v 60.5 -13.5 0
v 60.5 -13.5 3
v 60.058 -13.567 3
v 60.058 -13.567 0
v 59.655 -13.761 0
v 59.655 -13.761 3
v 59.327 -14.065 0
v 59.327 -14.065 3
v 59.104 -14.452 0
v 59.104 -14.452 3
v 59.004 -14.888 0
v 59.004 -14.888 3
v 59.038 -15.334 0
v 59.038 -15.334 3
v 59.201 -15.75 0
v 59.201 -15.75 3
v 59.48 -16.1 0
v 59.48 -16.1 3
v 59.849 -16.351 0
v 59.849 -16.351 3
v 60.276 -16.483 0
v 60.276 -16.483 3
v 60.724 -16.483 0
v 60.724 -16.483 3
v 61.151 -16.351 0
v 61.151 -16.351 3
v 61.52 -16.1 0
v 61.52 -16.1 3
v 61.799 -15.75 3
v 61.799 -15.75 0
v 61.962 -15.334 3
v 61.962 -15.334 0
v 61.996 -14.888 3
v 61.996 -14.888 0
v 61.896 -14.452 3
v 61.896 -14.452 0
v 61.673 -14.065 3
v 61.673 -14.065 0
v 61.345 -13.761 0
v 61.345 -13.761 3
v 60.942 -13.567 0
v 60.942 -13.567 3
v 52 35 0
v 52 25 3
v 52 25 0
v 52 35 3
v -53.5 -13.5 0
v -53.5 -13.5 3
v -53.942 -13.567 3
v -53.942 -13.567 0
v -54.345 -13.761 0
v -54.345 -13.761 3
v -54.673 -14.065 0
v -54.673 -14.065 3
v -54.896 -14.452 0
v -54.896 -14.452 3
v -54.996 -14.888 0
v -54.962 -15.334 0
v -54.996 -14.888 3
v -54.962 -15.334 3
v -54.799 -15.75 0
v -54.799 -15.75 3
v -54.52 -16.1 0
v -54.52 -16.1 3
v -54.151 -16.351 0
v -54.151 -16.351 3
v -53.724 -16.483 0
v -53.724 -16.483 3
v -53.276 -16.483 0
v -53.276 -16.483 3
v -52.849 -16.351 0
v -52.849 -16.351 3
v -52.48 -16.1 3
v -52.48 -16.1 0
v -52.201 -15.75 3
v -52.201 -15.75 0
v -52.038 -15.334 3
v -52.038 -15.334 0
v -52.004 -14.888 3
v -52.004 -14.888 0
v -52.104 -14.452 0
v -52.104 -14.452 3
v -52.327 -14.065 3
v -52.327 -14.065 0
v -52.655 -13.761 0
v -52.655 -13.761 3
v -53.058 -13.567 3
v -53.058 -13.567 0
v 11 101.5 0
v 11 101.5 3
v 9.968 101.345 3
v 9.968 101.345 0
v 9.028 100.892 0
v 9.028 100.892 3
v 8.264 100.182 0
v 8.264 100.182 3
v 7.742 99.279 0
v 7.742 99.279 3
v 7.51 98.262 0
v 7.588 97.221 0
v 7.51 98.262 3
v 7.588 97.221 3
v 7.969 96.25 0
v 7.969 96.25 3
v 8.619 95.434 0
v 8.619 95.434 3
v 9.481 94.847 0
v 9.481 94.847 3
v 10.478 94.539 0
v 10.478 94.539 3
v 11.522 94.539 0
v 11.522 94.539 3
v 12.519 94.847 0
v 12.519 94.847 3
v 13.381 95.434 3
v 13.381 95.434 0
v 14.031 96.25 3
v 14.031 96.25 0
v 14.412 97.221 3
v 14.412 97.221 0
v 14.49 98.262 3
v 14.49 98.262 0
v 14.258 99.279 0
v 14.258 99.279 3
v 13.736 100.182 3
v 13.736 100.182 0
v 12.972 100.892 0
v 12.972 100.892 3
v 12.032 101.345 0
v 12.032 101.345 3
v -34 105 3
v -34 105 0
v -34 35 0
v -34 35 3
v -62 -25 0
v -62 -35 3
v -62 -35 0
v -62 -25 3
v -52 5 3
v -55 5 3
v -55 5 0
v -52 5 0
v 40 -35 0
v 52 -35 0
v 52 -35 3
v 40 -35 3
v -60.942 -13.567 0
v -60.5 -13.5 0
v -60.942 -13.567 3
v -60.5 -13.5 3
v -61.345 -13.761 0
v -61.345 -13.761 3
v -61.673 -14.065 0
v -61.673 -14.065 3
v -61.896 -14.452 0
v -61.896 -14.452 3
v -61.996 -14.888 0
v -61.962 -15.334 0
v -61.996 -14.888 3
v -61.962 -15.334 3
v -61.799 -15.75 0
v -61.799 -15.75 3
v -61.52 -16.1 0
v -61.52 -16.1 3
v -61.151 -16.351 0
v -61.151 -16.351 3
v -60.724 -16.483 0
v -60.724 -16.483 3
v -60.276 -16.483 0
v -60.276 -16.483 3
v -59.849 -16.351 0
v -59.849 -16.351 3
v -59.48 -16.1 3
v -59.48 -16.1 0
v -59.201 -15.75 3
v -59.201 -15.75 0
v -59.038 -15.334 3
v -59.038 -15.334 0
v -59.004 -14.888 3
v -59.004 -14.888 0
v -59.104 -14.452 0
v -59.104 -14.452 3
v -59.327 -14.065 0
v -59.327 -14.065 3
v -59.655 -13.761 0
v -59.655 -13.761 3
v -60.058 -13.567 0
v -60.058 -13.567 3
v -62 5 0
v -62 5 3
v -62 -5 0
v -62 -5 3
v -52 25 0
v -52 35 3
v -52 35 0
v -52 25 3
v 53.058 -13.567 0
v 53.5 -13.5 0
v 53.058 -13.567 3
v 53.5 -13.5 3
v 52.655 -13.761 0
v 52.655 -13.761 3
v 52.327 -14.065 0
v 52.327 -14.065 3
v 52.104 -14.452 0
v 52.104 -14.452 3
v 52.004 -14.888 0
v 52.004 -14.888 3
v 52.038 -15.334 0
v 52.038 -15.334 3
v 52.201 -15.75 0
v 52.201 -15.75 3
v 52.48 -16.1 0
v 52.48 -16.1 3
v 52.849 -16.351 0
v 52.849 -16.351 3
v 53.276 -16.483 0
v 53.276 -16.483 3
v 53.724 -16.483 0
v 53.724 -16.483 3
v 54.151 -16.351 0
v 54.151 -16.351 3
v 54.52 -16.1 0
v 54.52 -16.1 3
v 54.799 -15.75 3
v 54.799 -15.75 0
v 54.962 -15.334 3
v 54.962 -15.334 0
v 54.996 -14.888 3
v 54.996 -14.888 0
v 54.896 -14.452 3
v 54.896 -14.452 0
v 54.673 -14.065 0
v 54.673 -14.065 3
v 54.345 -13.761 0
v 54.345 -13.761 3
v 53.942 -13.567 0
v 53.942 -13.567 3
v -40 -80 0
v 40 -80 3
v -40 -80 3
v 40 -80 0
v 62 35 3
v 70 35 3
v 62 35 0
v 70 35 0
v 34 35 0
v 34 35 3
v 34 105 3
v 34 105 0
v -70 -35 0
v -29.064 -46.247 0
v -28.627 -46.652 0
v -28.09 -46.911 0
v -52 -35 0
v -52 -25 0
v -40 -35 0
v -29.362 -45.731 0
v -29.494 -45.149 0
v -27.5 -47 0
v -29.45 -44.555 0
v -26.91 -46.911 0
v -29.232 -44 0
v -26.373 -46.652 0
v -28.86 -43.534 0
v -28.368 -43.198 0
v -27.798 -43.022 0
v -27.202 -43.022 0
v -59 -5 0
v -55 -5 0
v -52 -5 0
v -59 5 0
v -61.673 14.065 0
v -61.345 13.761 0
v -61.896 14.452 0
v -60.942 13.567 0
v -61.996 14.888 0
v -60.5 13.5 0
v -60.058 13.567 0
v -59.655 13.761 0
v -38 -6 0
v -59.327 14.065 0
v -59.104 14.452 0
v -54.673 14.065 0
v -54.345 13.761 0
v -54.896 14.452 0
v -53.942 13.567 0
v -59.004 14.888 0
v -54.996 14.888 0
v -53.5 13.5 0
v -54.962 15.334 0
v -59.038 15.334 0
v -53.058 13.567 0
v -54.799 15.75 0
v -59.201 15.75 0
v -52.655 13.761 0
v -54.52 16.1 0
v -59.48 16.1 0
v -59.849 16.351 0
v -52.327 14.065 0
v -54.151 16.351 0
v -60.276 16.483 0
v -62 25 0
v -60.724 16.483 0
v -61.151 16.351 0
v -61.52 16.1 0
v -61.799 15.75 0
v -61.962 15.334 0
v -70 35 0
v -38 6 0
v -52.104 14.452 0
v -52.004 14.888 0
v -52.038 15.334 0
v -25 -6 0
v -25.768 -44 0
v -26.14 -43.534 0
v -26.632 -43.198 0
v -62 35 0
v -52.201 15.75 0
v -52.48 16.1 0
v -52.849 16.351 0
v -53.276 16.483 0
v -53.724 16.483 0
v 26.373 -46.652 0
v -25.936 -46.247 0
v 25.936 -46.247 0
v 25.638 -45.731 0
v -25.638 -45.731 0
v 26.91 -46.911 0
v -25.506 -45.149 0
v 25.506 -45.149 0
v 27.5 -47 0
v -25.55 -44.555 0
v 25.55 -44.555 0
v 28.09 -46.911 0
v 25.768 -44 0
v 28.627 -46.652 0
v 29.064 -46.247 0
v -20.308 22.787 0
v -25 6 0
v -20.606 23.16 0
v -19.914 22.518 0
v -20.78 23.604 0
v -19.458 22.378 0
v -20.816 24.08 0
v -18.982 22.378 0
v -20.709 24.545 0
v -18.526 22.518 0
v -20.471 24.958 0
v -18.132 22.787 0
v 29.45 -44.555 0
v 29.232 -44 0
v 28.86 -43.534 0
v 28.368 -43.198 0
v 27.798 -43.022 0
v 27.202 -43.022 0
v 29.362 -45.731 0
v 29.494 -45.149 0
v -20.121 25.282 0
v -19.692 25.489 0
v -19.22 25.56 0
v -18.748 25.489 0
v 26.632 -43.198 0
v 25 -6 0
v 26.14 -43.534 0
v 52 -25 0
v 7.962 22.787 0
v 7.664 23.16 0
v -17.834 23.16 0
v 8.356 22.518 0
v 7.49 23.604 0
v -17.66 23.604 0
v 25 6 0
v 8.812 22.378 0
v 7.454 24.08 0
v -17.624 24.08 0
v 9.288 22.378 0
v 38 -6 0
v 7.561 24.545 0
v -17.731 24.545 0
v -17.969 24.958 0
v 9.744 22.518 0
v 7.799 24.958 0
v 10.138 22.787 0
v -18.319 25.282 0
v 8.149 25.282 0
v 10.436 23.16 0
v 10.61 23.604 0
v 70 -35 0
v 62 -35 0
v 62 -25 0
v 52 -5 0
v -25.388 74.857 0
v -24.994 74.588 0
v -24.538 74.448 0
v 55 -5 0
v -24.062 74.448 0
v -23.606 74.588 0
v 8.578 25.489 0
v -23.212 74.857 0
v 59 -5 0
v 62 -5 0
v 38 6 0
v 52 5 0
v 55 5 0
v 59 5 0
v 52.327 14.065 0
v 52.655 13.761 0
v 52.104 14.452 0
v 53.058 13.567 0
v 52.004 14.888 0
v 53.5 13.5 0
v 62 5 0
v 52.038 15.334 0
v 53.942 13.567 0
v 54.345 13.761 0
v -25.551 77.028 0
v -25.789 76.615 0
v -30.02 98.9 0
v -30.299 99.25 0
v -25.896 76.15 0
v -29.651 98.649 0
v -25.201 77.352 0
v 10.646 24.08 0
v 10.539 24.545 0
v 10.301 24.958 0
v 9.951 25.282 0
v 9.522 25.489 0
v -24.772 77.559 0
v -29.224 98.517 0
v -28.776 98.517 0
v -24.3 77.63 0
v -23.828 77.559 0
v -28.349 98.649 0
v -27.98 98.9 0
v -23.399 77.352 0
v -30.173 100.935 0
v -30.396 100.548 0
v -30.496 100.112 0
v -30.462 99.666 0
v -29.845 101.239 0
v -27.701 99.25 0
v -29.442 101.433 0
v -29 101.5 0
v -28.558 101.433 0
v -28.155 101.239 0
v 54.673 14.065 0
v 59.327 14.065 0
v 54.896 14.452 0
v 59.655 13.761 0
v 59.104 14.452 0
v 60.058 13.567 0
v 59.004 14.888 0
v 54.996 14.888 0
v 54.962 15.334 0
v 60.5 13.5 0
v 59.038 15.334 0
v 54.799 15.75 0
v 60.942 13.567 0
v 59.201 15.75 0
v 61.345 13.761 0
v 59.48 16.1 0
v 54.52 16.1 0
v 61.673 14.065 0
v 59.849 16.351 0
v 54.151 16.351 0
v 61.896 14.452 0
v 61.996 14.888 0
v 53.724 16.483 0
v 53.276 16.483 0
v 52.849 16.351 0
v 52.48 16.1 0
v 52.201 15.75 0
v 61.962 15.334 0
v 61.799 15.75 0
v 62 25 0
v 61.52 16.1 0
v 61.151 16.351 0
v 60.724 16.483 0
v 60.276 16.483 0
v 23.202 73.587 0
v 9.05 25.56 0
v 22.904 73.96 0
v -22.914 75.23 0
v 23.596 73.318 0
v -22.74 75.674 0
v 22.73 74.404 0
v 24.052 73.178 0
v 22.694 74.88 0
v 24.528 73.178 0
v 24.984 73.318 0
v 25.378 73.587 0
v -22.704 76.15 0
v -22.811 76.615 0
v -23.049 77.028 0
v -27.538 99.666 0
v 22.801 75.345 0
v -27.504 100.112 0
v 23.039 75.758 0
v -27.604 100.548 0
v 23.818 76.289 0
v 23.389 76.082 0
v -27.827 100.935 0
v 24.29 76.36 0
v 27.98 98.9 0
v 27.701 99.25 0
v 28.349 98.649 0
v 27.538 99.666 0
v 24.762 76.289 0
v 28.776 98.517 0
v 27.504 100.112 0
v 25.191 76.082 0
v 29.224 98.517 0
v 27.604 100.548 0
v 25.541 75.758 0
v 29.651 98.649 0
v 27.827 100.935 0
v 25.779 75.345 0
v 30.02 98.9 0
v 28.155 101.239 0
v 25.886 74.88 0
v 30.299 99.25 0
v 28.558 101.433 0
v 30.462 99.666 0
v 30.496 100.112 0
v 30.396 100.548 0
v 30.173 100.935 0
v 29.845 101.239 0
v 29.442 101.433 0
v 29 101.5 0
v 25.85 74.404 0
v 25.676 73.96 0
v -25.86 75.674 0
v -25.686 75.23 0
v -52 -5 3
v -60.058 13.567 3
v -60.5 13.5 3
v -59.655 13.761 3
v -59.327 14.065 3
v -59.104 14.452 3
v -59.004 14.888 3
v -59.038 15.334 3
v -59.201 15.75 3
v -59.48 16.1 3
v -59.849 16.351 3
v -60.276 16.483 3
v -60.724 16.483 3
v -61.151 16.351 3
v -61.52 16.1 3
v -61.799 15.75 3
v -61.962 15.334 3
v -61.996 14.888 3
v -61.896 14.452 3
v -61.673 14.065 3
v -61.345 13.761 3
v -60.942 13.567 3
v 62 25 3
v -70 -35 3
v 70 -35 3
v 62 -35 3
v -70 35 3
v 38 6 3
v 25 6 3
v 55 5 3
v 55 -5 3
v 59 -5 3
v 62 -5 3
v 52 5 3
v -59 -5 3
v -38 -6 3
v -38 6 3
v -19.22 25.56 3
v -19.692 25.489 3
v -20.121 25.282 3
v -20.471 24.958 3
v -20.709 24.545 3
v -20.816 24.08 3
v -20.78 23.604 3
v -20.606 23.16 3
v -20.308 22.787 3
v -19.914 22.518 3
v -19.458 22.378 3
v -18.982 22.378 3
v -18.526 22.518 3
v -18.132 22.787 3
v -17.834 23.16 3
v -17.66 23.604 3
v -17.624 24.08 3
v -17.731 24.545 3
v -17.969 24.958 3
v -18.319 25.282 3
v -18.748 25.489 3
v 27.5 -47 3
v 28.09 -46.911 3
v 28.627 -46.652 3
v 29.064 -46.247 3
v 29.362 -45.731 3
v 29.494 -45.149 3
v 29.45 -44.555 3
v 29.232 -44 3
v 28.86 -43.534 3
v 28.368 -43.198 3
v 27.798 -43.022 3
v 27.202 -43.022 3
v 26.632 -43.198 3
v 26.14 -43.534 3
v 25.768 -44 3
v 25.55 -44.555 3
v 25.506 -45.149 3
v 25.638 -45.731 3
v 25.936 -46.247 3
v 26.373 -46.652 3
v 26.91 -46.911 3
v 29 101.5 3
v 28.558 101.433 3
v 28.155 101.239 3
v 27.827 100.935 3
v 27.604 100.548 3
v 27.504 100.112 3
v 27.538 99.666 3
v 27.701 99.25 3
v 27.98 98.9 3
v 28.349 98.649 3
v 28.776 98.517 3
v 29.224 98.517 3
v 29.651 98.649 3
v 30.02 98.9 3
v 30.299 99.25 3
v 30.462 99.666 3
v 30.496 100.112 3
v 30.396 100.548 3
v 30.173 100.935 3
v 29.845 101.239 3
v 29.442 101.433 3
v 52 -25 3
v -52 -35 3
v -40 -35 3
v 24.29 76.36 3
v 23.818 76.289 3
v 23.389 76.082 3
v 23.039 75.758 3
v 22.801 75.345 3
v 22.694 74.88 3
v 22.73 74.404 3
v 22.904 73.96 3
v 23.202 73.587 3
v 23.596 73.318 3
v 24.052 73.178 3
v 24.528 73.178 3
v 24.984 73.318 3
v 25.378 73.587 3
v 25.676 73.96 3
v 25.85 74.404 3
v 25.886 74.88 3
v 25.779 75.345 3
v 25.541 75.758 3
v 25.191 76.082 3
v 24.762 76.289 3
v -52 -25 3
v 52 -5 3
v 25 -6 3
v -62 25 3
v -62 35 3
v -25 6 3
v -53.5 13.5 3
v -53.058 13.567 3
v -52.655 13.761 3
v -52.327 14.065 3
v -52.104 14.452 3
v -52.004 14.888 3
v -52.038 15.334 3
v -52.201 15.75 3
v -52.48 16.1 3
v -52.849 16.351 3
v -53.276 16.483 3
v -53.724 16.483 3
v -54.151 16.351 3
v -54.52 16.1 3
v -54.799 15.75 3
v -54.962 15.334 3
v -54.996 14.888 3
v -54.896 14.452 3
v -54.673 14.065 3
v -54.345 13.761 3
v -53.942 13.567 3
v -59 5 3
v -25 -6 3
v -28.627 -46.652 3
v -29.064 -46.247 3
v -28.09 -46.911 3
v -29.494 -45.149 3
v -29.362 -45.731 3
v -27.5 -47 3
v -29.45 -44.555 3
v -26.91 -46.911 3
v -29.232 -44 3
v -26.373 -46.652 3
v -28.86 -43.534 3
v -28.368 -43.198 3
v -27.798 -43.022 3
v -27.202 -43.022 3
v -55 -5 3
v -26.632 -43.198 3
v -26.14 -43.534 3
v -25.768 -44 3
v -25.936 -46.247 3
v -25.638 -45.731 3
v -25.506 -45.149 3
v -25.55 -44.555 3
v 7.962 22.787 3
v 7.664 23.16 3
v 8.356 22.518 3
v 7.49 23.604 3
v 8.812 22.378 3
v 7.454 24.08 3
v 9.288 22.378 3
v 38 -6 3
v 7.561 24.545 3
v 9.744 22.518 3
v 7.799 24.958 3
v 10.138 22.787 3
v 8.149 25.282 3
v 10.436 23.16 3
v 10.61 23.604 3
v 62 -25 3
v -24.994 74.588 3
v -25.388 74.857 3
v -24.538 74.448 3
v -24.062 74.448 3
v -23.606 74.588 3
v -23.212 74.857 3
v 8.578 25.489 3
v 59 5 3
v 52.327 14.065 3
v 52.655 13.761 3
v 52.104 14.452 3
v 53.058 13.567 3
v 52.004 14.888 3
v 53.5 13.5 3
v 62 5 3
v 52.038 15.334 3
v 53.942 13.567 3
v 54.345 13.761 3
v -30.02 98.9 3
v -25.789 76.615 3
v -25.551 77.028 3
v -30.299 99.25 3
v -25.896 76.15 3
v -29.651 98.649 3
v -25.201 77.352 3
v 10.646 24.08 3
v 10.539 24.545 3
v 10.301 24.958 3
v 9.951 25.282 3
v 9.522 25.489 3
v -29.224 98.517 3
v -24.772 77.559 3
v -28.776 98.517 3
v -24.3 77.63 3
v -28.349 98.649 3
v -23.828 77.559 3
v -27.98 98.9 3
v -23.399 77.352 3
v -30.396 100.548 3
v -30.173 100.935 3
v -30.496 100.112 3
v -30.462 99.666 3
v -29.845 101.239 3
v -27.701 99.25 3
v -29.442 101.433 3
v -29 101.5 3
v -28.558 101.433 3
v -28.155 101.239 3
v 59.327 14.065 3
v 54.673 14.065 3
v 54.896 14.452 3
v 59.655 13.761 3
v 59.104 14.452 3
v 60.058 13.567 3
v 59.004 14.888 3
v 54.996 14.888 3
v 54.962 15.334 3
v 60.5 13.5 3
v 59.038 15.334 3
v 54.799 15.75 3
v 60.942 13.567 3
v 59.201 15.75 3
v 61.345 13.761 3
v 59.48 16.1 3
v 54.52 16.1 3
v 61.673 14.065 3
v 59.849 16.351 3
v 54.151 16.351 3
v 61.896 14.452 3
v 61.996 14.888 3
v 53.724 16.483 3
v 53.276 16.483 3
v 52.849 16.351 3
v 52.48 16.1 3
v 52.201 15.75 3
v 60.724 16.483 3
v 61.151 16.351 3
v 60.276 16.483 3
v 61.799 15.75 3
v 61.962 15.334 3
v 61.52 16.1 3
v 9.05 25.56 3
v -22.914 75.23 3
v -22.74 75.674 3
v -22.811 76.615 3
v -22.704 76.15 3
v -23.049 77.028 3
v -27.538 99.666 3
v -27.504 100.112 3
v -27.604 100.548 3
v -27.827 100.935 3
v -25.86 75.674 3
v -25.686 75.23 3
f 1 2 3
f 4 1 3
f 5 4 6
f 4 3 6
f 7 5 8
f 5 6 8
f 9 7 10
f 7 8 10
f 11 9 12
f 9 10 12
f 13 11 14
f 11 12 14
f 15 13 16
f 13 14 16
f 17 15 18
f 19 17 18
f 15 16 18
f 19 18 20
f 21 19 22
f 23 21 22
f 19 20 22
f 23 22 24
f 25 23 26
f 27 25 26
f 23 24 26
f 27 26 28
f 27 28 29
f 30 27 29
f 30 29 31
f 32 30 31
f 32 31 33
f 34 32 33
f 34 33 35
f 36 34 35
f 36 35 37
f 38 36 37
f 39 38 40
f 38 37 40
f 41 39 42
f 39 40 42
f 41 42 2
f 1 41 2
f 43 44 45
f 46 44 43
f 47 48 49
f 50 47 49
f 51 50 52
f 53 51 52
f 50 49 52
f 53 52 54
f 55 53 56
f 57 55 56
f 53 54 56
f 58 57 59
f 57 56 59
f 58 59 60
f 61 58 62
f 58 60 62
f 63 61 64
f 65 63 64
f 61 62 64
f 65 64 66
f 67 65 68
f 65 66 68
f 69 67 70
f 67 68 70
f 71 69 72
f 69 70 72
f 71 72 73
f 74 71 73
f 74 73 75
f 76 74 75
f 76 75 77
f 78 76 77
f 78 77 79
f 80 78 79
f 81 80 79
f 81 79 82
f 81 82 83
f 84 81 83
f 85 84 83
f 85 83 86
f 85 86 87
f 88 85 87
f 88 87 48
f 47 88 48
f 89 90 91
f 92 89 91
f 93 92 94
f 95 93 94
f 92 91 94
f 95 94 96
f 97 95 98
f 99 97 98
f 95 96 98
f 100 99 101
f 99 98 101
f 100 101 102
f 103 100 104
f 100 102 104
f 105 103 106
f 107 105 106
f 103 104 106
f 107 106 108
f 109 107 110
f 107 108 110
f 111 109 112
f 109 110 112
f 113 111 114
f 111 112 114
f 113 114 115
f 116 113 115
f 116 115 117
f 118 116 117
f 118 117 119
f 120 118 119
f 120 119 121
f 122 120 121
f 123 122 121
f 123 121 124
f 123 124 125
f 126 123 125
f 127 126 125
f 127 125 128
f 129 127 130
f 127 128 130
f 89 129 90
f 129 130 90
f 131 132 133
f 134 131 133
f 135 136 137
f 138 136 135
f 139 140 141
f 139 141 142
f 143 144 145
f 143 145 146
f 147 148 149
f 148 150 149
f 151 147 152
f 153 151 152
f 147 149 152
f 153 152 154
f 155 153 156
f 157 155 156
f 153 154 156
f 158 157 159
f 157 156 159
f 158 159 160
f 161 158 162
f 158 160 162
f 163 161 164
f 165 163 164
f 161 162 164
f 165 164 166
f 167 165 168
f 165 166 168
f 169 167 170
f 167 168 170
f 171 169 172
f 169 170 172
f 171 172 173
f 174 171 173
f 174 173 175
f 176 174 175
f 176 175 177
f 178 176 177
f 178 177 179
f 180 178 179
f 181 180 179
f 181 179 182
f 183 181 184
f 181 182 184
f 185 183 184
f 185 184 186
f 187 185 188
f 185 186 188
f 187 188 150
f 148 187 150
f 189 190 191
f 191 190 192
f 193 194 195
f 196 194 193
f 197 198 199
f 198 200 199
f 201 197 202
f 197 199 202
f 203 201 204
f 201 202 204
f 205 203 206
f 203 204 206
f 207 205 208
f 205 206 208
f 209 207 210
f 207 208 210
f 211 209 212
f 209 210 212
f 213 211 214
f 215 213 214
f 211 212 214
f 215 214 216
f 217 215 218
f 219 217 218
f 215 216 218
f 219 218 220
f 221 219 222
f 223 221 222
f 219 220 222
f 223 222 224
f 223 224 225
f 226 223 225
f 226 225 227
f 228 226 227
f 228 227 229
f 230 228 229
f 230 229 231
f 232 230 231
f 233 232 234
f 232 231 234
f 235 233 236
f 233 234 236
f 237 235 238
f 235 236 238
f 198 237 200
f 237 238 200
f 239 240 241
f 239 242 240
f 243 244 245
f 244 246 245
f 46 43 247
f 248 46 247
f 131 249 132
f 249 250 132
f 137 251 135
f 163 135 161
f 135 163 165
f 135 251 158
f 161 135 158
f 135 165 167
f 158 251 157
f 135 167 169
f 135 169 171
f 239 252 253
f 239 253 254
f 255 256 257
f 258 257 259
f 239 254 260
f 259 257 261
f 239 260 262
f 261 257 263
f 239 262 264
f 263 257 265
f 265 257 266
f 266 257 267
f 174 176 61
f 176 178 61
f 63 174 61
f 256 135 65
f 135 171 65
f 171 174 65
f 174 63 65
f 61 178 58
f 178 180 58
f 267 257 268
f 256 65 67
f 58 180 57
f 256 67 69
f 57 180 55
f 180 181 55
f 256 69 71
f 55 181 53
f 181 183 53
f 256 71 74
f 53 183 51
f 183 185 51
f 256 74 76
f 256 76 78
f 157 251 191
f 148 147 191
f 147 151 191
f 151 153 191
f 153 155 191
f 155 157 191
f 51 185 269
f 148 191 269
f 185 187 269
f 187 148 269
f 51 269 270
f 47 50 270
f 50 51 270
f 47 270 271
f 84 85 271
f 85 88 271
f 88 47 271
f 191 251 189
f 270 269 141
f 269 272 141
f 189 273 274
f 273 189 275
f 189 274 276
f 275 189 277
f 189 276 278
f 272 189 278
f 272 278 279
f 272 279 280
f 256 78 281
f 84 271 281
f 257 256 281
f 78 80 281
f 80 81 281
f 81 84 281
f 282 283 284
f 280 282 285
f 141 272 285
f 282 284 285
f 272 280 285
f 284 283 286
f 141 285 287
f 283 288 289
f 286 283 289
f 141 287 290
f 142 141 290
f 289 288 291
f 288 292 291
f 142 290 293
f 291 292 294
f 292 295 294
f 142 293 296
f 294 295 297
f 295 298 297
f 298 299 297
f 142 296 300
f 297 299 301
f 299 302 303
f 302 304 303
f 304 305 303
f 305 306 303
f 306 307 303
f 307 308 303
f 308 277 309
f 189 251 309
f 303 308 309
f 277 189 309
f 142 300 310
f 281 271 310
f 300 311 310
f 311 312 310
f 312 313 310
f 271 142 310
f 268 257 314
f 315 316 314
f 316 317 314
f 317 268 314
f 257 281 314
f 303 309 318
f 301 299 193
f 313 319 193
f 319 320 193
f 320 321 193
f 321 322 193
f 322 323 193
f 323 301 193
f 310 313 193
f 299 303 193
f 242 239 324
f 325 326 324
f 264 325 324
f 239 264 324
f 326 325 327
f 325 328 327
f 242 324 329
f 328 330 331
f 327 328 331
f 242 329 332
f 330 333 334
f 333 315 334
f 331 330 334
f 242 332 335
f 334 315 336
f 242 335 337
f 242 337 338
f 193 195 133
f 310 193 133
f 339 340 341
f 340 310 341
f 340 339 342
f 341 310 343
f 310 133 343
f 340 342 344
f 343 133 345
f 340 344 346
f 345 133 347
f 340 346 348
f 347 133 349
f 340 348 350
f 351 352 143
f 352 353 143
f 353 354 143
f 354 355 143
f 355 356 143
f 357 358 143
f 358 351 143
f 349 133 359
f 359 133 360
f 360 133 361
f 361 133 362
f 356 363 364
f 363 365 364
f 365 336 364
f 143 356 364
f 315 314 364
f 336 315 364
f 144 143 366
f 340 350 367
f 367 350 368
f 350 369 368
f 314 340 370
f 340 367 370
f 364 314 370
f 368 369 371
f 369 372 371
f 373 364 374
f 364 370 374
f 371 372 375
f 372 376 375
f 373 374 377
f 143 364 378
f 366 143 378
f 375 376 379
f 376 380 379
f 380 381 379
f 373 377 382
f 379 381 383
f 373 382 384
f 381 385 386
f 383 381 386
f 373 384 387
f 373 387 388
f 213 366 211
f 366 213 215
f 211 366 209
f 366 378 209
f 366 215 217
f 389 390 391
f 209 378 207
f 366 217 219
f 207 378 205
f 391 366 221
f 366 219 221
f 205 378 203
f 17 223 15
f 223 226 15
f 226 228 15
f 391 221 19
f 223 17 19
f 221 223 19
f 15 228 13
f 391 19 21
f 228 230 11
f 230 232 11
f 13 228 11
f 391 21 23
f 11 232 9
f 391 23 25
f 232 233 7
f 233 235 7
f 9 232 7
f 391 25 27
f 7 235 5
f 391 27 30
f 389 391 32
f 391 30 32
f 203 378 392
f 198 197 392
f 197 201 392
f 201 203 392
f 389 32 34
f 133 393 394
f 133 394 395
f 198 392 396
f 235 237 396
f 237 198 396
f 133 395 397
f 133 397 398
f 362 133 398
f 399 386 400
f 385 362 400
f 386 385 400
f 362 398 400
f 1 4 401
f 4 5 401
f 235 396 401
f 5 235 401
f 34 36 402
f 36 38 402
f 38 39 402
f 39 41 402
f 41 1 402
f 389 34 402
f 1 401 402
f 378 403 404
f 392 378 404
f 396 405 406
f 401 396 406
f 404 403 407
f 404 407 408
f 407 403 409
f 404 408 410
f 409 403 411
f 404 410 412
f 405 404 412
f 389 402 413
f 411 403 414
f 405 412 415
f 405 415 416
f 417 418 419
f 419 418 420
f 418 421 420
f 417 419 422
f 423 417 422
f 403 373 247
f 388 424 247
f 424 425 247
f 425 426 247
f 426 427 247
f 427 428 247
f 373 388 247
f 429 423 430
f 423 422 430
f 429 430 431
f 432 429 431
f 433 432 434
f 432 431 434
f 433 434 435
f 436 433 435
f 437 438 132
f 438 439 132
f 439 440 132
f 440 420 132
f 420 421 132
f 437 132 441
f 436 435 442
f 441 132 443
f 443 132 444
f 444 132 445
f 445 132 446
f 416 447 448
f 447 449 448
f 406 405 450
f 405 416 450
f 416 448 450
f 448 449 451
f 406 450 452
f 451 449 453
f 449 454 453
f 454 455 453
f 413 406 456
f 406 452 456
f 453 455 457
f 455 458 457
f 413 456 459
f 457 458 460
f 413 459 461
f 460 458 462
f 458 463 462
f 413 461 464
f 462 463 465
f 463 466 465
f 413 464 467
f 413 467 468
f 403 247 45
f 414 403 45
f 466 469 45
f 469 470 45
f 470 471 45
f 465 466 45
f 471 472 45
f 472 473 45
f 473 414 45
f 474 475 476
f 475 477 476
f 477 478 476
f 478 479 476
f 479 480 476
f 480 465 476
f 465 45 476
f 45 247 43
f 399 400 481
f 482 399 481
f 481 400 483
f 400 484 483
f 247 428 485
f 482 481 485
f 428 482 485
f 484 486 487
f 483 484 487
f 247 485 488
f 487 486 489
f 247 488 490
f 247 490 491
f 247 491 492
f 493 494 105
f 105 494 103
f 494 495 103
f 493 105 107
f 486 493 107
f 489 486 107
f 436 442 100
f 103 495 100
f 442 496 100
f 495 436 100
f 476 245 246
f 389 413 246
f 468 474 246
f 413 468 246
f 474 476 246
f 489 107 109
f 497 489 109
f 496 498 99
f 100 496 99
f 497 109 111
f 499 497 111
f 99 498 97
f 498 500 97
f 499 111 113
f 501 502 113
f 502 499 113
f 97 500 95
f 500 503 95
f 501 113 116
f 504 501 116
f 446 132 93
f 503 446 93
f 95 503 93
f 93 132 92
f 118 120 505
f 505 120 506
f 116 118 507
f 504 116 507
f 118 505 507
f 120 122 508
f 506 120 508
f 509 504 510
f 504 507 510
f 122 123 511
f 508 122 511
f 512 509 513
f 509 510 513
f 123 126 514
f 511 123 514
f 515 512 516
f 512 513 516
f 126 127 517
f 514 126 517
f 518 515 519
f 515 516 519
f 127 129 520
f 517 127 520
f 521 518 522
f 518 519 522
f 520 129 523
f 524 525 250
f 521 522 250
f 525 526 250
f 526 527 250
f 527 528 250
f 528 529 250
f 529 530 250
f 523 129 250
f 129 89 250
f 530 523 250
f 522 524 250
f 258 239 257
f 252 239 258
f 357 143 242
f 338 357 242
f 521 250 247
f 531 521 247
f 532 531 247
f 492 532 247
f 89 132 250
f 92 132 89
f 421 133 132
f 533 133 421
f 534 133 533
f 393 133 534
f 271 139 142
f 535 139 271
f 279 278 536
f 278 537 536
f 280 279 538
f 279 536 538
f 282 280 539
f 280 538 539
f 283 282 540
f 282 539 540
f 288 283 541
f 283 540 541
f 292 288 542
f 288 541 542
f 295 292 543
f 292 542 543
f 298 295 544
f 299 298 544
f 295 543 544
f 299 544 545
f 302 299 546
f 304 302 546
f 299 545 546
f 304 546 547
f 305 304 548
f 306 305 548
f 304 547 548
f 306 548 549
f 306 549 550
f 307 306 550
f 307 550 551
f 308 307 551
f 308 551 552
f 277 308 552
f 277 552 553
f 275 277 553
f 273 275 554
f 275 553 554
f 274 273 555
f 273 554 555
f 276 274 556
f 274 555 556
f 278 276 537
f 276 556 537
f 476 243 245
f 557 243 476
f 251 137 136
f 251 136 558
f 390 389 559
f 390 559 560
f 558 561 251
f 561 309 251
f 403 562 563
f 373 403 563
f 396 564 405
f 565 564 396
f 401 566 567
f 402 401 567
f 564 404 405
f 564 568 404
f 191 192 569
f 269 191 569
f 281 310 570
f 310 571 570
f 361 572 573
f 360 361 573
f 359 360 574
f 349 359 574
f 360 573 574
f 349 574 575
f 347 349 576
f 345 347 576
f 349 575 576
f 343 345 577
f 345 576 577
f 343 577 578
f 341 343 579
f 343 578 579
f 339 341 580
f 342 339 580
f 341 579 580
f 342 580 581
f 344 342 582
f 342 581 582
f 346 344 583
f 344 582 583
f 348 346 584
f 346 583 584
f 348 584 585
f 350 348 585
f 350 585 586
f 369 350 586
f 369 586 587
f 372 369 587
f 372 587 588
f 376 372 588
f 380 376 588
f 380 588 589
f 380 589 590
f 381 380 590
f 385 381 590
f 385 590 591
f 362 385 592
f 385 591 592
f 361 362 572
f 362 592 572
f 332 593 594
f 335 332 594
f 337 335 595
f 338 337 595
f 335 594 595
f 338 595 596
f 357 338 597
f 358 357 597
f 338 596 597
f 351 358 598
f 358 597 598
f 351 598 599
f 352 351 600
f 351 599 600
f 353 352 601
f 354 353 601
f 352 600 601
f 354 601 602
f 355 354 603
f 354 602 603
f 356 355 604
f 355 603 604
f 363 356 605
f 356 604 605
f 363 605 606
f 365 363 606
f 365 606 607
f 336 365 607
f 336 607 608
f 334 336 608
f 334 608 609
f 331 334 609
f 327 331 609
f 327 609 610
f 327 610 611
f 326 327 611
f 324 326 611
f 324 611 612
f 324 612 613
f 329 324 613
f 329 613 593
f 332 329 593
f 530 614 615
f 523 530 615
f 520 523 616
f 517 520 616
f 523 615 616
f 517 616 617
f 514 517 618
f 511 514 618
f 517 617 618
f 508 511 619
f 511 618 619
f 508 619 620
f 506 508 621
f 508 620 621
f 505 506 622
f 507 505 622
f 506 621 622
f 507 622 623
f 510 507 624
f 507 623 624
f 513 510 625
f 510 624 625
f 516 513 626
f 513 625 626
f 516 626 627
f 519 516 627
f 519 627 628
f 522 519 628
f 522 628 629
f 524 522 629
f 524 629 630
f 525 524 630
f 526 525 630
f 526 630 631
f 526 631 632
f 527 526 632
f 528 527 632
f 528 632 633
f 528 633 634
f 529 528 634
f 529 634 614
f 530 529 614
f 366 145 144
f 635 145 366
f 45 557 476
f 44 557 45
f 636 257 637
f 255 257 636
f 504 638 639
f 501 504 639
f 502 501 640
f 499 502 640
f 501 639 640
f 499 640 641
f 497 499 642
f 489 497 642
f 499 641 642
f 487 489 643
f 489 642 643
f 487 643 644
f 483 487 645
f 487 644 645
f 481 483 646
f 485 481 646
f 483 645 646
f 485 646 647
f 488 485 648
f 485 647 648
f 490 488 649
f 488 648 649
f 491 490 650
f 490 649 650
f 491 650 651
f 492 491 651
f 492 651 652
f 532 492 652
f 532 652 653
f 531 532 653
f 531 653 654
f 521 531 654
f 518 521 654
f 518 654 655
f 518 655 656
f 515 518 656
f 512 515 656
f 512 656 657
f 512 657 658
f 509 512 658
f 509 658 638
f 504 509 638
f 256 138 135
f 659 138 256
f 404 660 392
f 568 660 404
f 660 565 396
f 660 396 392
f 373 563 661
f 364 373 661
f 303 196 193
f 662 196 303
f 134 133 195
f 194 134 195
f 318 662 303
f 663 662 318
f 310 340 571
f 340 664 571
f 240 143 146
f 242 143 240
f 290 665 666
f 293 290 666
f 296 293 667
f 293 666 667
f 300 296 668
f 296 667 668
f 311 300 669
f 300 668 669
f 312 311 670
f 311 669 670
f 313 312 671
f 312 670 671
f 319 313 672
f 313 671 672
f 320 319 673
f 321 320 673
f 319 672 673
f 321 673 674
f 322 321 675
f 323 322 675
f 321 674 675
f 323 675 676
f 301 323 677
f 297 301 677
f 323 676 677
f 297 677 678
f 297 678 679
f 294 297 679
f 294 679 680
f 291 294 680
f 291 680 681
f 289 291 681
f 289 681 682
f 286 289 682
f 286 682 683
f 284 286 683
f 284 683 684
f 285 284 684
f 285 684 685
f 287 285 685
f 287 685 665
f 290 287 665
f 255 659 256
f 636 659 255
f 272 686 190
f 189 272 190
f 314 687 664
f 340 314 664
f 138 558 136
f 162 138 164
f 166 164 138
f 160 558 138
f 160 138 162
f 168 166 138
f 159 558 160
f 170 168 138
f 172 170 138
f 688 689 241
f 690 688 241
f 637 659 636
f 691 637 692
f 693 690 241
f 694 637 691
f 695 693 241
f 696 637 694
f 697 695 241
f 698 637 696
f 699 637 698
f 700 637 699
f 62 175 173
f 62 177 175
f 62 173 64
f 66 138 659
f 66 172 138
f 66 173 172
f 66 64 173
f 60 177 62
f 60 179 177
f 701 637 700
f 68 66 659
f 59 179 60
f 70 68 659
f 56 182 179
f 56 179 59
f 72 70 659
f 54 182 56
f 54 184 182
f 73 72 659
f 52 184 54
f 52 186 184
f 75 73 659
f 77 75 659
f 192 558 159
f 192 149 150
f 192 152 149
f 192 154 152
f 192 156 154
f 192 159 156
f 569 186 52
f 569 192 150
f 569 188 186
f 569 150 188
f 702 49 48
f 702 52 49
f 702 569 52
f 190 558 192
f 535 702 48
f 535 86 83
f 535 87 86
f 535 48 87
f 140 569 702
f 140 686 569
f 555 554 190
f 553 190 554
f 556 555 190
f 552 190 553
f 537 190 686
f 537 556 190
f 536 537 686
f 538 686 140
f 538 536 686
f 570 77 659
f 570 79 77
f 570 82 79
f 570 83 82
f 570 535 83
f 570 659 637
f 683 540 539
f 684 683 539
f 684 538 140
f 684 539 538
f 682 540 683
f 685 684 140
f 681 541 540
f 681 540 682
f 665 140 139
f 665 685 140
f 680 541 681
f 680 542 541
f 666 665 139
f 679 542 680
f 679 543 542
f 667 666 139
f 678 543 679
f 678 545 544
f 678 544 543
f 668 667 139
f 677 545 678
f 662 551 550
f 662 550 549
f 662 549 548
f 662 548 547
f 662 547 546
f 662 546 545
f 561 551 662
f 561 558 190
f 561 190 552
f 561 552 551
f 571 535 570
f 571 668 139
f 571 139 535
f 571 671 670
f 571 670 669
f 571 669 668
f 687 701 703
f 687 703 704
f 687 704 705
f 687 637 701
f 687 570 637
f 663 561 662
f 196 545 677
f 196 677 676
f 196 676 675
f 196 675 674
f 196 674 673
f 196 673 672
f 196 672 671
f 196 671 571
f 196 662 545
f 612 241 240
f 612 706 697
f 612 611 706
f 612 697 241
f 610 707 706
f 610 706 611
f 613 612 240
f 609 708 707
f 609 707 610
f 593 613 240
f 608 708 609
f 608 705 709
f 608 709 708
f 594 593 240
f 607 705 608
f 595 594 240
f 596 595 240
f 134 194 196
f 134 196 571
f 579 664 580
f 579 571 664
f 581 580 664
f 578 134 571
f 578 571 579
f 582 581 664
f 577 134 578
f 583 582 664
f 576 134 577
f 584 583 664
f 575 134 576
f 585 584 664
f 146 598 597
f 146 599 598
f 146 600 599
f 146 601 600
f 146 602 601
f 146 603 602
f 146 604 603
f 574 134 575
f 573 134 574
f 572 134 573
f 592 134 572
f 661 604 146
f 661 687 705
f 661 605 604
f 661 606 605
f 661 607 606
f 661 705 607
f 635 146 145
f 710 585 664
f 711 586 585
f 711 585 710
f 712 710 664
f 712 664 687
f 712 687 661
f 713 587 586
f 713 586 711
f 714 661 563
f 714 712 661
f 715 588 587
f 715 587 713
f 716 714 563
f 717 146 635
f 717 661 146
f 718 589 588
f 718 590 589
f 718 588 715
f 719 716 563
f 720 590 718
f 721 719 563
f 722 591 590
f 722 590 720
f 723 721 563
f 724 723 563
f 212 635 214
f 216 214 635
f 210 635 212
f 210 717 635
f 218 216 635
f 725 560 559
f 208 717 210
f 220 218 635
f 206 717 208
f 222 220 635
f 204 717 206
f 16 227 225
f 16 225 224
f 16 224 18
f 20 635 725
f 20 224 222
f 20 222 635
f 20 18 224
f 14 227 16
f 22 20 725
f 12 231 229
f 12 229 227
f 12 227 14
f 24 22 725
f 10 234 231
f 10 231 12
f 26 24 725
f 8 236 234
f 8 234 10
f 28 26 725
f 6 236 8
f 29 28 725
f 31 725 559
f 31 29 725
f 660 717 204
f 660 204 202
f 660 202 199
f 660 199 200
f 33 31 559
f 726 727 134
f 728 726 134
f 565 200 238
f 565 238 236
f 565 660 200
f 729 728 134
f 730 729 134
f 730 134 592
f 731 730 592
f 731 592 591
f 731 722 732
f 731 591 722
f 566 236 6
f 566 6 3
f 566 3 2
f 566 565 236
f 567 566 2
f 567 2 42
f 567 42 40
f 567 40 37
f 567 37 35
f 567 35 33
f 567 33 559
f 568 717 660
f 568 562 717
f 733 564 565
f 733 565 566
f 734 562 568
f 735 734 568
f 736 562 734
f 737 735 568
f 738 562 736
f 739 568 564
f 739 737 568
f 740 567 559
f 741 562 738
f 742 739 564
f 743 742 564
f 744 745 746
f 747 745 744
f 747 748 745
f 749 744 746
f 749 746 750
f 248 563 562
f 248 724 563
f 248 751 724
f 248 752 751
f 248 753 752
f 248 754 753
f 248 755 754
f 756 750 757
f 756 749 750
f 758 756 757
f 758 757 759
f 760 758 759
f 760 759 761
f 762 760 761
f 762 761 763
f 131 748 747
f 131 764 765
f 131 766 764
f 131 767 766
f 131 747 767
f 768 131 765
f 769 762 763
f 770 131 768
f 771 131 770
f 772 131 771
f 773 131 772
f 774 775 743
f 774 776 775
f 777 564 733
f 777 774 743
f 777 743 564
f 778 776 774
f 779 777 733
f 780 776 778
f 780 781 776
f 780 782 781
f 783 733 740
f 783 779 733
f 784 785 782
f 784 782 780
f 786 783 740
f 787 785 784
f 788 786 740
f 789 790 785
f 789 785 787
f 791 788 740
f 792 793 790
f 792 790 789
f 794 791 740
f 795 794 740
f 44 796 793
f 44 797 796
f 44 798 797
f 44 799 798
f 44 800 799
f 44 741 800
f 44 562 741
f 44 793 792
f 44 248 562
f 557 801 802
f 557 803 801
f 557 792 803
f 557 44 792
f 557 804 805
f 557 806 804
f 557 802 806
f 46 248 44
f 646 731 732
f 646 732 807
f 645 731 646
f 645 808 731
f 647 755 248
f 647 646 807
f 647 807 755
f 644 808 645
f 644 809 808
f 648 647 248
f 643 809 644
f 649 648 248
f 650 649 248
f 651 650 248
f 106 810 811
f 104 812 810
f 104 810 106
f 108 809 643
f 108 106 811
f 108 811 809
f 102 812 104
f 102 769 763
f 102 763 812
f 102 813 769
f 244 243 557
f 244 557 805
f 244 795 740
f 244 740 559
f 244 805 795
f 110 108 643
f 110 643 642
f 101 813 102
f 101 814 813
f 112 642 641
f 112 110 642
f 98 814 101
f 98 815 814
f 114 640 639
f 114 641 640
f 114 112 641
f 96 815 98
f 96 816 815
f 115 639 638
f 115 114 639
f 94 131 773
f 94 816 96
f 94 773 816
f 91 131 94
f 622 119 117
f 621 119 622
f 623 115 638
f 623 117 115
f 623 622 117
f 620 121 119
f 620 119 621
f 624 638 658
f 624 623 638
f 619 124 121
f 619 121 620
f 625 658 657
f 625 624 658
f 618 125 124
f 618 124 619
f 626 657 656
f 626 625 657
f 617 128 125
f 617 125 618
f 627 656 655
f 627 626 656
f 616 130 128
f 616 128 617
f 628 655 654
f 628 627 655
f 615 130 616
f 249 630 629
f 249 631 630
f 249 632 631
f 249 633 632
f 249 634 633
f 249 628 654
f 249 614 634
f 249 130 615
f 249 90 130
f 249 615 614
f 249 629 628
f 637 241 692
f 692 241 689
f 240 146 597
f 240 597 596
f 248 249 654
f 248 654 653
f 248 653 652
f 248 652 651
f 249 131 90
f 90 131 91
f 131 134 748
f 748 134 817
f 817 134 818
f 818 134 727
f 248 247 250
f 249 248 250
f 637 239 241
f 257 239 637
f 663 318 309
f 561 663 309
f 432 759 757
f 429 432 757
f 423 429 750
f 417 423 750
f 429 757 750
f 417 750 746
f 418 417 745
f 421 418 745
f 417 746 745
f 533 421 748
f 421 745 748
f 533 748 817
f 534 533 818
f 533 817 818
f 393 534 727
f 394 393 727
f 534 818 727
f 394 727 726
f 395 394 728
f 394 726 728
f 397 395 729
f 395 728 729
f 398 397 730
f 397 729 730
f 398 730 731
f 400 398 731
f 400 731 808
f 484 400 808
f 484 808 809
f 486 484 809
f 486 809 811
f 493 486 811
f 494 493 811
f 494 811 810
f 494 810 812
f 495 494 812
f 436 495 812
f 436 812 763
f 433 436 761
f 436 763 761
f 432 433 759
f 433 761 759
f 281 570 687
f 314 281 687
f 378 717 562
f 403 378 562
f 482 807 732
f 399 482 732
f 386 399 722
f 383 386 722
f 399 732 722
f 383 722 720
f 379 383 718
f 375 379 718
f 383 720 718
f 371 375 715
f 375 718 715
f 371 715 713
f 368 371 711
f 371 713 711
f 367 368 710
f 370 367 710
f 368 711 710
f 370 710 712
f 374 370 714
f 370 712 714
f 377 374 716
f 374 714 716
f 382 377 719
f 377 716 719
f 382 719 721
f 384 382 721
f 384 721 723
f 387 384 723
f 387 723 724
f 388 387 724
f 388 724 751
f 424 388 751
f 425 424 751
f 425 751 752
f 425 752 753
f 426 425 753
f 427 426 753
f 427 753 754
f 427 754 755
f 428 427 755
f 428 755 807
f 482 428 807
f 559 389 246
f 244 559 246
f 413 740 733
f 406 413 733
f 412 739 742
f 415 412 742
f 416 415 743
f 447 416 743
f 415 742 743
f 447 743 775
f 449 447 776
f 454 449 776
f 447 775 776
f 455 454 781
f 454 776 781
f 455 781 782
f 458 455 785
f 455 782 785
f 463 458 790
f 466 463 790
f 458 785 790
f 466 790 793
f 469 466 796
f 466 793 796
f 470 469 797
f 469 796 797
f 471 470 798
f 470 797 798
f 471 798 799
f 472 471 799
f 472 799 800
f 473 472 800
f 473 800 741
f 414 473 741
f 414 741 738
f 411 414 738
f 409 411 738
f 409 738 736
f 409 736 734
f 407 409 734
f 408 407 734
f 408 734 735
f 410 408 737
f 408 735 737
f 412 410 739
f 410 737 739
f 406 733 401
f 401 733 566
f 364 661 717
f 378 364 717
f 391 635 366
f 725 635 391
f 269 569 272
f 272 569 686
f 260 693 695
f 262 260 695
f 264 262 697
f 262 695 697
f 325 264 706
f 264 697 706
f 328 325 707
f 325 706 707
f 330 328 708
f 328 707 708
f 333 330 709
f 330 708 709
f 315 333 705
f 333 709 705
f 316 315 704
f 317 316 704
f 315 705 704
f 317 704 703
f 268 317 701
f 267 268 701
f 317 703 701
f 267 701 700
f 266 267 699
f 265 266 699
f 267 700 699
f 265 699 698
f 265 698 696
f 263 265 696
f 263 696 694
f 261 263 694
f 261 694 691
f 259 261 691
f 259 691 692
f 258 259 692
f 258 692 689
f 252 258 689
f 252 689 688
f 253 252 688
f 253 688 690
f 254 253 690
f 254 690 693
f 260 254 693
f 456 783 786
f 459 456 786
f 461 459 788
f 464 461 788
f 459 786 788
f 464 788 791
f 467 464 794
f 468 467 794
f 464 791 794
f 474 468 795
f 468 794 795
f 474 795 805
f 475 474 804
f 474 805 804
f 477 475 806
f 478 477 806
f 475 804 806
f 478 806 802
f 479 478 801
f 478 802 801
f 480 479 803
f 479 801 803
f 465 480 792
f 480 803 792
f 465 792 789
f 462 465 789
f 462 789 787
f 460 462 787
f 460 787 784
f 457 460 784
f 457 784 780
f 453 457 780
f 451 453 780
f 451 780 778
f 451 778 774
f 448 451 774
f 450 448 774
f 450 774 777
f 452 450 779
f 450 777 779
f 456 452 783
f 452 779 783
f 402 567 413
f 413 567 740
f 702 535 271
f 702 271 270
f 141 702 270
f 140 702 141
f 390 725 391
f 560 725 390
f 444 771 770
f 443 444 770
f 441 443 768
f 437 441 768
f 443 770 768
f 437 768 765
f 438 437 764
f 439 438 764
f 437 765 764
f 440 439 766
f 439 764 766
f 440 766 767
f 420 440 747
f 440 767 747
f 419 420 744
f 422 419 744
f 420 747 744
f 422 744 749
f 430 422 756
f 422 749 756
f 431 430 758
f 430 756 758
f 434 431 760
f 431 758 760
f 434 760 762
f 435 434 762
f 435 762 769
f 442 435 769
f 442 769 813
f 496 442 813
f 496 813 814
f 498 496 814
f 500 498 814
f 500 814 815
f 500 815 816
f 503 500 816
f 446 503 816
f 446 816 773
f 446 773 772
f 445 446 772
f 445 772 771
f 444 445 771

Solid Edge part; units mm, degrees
sketch "Sketch1" plane through (0, 0, 0) normal (0, 0, 1) x (1, 0, 0)
  line L0 (70, -35) -> (70, 35)
  line L1 (70, 35) -> (34, 35)
  line L2 (34, 35) -> (34, 105)
  line L3 (34, 105) -> (-34, 105)
  line L4 (-34, 105) -> (-34, 35)
  line L5 (-34, 35) -> (-70, 35)
  line L6 (-70, 35) -> (-70, -35)
  line L7 (-40, -35) -> (-70, -35)
  line L8 (-40, -80) -> (-40, -35)
  line L9 (40, -80) -> (-40, -80)
  line L10 (40, -35) -> (40, -80)
  line L11 (70, -35) -> (40, -35)
  dimension "D1" = 70
  dimension "D2" = 30
  dimension "D3" = 45
  dimension "D4" = 140
  dimension "D5" = 68
  dimension "D6" = 36
  dimension "D7" = 70
extrude "Ajout_matière_2" add sketch "Sketch1" along normal blind 3
sketch "Sketch2" plane through (0, -7.5, 3) normal (0, 0, 1) x (0, -1, 0)
  line L0 (-12.5, 55) -> (-2.5, 55)
  line L1 (-2.5, 55) -> (-2.5, 52)
  line L2 (-2.5, 52) -> (-12.5, 52)
  line L3 (-12.5, 52) -> (-12.5, 55)
  line L4 (-13.5, 25) -> (-1.5, 25)
  line L5 (-1.5, 25) -> (-1.5, 38)
  line L6 (-1.5, 38) -> (-13.5, 38)
  line L7 (-13.5, 38) -> (-13.5, 25)
  circle A0 centre (37.5, 27.5) radius 2
  line L8 (-12.5, 59) -> (-2.5, 59)
  line L9 (-2.5, 59) -> (-2.5, 62)
  line L10 (-2.5, 62) -> (-12.5, 62)
  line L11 (-12.5, 62) -> (-12.5, 59)
  dimension "D1" = 10
  dimension "D2" = 3
  dimension "D3" = 4
  dimension "D4" = 8
  dimension "D5" = 4
  dimension "D6" = 35
  dimension "D7" = 27.5
  dimension "D8" = 32
  dimension "D9" = 12
  dimension "D10" = 13
extrude "Cutout1" cut sketch "Sketch2" against normal blind 6.2892
sketch "Sketch3" plane through (0, -7.5, 3) normal (0, 0, 1) x (0, -1, 0)
  line L0 (-42.5, 52) -> (-42.5, 62)
  line L1 (-42.5, 62) -> (-32.5, 62)
  line L2 (-32.5, 62) -> (-32.5, 52)
  line L3 (-32.5, 52) -> (-42.5, 52)
  dimension "D1" = 20
  dimension "D2" = 10
extrude "Enlèvement_matière_13" cut sketch "Sketch3" against normal blind 16.2231
sketch "Sketch4" plane through (0, -7.5, 3) normal (0, 0, 1) x (0, -1, 0)
  circle A0 centre (-22.5, 60.5) radius 1.5
  circle A1 centre (-22.5, 53.5) radius 1.5
  dimension "D1" = 3
  dimension "D2" = 3
  dimension "D3" = 10
  dimension "D4" = 10
extrude "Enlèvement_matière_14" cut sketch "Sketch4" against normal blind 7.9074
mirror "Mirror1" about plane through (0, 0, 0) normal (0, -1, 0) of "Enlèvement_matière_13", "Enlèvement_matière_14"
mirror "Mirror2" about plane through (0, 0, 0) normal (1, 0, 0) of "Enlèvement_matière_14", "Mirror1", "Enlèvement_matière_13", "Cutout1"
sketch "Sketch5" plane through (0, 10, 3) normal (0, 0, 1) x (0, 1, 0)
  circle A0 centre (66.03, 24.3) radius 1.6
  circle A1 centre (64.76, -24.29) radius 1.6
  circle A2 centre (13.96, 19.22) radius 1.6
  circle A3 centre (13.96, -9.05) radius 1.6
  dimension "D1" = 28.97
  dimension "D2" = 9.7
  dimension "D3" = 81.04
  dimension "D4" = 14.78
  dimension "D5" = 9.71
  dimension "D6" = 30.24
  dimension "D7" = 24.95
  dimension "D8" = 81.04
  dimension "D9" = 3.2
  dimension "D10" = 3.2
  dimension "D11" = 3.2
  dimension "D12" = 3.2
extrude "Cutout9" cut sketch "Sketch5" against normal blind 7.5802
sketch "Sketch6" plane through (0, 12.5, 3) normal (0, 0, 1) x (0, 1, 0)
  circle A0 centre (87.5, 29) radius 1.5
  circle A1 centre (87.5, -29) radius 1.5
  circle A2 centre (85.5, -11) radius 3.5
  dimension "D1" = 5
  dimension "D2" = 3
  dimension "D3" = 3
  dimension "D4" = 5
  dimension "D5" = 5
  dimension "D6" = 7
  dimension "D7" = 45
  dimension "D8" = 7
extrude "Enlèvement_matière_23" cut sketch "Sketch6" against normal blind 9.1147
properties part number "25" material "MDF 3mm"
